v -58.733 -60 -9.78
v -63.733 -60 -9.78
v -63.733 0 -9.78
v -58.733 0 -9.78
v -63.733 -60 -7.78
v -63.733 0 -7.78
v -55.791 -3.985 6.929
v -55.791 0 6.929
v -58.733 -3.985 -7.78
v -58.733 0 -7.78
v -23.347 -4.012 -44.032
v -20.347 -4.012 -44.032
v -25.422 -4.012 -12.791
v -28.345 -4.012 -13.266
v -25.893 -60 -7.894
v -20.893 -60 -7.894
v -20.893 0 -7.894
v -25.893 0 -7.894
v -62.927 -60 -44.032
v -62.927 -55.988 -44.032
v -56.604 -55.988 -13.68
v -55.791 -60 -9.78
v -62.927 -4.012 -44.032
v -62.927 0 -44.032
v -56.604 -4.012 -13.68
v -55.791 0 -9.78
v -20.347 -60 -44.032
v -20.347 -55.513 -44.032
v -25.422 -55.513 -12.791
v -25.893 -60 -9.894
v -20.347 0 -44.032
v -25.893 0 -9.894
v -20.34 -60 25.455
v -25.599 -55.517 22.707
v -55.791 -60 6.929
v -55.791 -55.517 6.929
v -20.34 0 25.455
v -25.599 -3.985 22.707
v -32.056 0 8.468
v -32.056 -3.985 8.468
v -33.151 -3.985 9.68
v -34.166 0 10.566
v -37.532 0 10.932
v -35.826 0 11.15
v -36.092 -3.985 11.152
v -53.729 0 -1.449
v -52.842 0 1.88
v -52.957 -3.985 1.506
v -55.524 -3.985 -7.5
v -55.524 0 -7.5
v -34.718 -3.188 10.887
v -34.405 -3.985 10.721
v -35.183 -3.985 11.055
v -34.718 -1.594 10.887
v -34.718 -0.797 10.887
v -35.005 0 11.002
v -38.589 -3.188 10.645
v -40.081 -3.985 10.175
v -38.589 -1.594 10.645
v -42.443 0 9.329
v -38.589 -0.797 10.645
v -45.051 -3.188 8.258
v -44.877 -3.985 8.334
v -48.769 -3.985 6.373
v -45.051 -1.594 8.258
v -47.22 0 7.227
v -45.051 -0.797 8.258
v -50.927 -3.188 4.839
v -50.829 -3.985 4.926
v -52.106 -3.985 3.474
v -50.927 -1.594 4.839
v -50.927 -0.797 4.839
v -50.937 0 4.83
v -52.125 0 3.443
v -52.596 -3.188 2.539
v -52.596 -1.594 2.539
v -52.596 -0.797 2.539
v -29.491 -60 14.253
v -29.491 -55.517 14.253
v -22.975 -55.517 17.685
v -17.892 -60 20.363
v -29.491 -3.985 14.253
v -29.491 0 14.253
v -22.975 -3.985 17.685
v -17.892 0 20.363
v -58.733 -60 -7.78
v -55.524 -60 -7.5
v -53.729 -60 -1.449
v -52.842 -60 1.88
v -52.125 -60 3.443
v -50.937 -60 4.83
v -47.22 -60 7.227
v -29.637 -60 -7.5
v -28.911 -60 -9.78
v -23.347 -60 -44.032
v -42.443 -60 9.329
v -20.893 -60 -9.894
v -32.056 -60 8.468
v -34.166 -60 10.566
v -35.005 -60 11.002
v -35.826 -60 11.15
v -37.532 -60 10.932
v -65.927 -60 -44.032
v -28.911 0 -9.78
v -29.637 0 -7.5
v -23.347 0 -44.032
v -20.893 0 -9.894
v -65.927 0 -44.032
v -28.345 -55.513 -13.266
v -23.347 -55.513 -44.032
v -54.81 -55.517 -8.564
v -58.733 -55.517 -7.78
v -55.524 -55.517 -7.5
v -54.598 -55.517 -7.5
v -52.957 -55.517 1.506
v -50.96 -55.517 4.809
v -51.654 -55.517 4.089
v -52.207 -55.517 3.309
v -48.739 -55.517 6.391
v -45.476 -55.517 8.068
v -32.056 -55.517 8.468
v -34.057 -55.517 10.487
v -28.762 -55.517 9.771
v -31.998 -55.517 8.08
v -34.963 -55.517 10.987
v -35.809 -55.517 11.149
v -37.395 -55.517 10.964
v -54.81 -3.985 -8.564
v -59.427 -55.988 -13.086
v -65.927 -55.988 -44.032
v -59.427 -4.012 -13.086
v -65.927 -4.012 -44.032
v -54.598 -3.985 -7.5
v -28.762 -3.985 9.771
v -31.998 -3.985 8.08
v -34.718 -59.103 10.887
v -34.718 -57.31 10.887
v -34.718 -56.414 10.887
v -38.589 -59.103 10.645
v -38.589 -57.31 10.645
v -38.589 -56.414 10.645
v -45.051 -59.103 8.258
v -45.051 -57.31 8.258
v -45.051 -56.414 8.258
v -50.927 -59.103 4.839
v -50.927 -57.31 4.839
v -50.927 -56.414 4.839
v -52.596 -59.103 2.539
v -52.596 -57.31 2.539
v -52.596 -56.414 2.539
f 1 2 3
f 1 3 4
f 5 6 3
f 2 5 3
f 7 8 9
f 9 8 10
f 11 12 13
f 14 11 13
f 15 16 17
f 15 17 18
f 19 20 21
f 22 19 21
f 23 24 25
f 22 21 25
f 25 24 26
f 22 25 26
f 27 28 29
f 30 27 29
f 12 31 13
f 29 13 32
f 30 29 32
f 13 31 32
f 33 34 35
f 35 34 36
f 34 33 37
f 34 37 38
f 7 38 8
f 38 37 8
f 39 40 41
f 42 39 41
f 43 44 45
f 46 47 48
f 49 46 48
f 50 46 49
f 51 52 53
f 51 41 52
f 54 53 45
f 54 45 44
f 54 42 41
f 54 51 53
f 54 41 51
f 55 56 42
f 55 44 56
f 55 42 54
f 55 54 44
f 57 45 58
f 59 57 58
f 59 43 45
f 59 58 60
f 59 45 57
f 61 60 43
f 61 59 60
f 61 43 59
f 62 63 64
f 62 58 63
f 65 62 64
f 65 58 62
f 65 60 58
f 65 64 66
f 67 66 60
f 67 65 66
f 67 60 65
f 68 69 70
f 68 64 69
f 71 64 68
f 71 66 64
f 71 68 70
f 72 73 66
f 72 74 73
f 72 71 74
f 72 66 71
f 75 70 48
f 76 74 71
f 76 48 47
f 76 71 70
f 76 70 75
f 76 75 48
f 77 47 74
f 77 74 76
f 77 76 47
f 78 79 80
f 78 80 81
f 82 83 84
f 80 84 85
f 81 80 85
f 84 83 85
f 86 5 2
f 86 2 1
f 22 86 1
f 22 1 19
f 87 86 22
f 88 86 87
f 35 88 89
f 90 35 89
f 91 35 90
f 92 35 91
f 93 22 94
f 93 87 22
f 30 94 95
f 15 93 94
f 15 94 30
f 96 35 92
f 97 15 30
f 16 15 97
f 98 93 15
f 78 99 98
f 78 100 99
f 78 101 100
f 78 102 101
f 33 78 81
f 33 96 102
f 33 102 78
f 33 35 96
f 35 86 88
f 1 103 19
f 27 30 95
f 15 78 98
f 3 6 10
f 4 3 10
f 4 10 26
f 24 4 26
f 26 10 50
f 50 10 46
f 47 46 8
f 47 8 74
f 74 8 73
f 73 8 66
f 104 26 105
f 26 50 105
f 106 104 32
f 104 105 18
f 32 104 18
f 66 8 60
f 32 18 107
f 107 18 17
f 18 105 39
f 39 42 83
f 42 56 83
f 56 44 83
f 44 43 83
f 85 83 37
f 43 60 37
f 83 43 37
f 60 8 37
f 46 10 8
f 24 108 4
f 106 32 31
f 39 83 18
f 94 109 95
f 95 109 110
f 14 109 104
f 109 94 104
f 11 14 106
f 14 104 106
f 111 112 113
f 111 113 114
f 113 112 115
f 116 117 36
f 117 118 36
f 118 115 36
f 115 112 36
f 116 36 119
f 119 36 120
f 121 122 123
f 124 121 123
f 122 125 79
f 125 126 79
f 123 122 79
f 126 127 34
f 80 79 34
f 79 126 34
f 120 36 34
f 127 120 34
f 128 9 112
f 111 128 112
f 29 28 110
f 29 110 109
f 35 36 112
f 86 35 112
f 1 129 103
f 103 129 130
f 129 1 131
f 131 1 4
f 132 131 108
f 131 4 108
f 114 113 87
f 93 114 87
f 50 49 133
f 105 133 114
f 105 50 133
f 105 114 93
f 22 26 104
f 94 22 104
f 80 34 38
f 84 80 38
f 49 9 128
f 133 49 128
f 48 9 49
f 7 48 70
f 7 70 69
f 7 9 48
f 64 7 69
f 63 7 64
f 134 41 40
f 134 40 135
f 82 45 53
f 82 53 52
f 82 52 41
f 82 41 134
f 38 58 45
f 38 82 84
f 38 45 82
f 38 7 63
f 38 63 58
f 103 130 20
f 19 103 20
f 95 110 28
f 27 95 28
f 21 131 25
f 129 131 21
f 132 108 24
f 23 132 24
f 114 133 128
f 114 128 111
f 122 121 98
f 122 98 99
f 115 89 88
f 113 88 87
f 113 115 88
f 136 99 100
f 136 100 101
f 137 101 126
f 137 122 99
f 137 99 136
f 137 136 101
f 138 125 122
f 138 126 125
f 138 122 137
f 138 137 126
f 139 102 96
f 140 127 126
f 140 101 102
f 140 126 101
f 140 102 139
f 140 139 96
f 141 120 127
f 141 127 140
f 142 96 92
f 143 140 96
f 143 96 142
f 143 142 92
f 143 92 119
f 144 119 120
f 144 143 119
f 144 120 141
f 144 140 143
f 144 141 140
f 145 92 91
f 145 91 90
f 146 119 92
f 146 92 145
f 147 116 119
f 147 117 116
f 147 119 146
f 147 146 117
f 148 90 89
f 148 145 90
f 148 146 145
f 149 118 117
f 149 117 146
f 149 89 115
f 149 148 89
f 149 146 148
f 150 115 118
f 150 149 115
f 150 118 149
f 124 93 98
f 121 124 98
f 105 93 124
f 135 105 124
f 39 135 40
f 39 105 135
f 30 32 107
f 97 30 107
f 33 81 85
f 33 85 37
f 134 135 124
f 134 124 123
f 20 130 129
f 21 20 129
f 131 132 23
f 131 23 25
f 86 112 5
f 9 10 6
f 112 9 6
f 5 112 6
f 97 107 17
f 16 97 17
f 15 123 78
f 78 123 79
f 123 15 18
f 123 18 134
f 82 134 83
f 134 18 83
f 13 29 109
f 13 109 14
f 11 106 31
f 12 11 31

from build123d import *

# Parameters (mm, degrees)
F2_DEPTH  = 60
F3_DEPTH  = 60
F4_W      = 34.0656559074
F4_H      = 51.5325679444
F5_DEPTH  = 10
F6_W      = 51.5325679444
F6_H      = 15
F7_DEPTH  = 4
F8_W      = 51.9751724787
F8_H      = 31.6211068177
F9_DEPTH  = 15
F10_W     = 51.5005090274
F10_H     = 31.6510945126
F11_DEPTH = 6.8


with BuildPart() as f2:
    # F0 (on Front) → F2 (new body)
    with BuildSketch(Plane.XZ):
        Polygon((-17.8921578123, 20.3632246609), (-20.3399246612, 25.4550932741), (-55.7910754849, 6.9290061191), (-58.7328180983, -7.779703899), (-63.7328180983, -7.779703899), (-63.7328180983, -9.779703899), (-58.7328180983, -9.779703899), (-65.9274235368, -44.0322607756), (-62.9274235368, -44.0322607756), (-55.7910754849, -9.779703899), (-28.9112906903, -9.779703899), (-23.3467742801, -44.0322607756), (-20.3467742801, -44.0322607756), (-25.8926429036, -9.8944909401), (-20.8926429036, -9.8944909401), (-20.8926429036, -7.8944909401), (-25.8926429036, -7.8944909401), (-29.4905570809, 14.25258365), (-20.6433312194, 18.913763174), align=None)
    extrude(amount=F2_DEPTH)

    # F1 (on Front) → F3 (cut)
    with BuildSketch(Plane.XZ):
        with BuildLine():
            add(Edge.make_bspline(
                [(-32.0564545691, 8.4677422419), (-32.9182067785, 9.4601825496), (-34.6748450566, 11.4832219038), (-38.7271868794, 10.9055197371), (-52.1695896145, 5.7227527212), (-53.2214258813, 0.0155056606), (-54.7111549811, -4.8464931653), (-55.5241964757, -7.500000298)],
                knots=[0, 0, 0, 0, 0.1495745389, 0.3049001298, 0.5961488941, 0.7795923388, 1, 1, 1, 1], degree=3))
            Line((-55.5241964757, -7.500000298), (-29.6370983124, -7.500000298))
            Line((-29.6370983124, -7.500000298), (-32.0564545691, 8.4677422419))
        make_face()
    extrude(amount=F3_DEPTH, mode=Mode.SUBTRACT)

    # F4 (on face) → F5 (cut)
    with BuildSketch(Plane(origin=(-14.8119721989, 0, 28.3438945324), x_dir=(0.8862787706, 0, 0.4631521789), z_dir=(-0.4631521789, 0, 0.8862787706))):
        with Locations((-29.2044335556, -29.7510505188)):
            Rectangle(F4_W, F4_H)
    extrude(amount=-F5_DEPTH, mode=Mode.SUBTRACT)

    # F6 (on face) → F7 (cut)
    with BuildSketch(Plane(origin=(-54.9777654657, 0, 10.9955553723), x_dir=(0, -1, 0), z_dir=(-0.9805806679, 0, 0.1961161742))):
        with Locations((29.7510505188, -11.647082832)):
            Rectangle(F6_W, F6_H)
    extrude(amount=-F7_DEPTH, mode=Mode.SUBTRACT)

    # F8 (on face) → F9 (cut)
    with BuildSketch(Plane(origin=(-54.2836781091, 0, 11.4020581632), x_dir=(0, -1, 0), z_dir=(-0.9786444822, 0, 0.2055601554))):
        with Locations((30.0000028219, -40.8334270638)):
            Rectangle(F8_W, F8_H)
    extrude(amount=-F9_DEPTH, mode=Mode.SUBTRACT)

    # F10 (on face) → F11 (cut)
    with BuildSketch(Plane(origin=(-26.7929436535, 0, -4.3526611802), x_dir=(0, 1, 0), z_dir=(0.987059687, 0, 0.1603532795))):
        with Locations((-29.7626692336, -24.3742503009)):
            Rectangle(F10_W, F10_H)
    extrude(amount=-F11_DEPTH, mode=Mode.SUBTRACT)


solid = f2.part
